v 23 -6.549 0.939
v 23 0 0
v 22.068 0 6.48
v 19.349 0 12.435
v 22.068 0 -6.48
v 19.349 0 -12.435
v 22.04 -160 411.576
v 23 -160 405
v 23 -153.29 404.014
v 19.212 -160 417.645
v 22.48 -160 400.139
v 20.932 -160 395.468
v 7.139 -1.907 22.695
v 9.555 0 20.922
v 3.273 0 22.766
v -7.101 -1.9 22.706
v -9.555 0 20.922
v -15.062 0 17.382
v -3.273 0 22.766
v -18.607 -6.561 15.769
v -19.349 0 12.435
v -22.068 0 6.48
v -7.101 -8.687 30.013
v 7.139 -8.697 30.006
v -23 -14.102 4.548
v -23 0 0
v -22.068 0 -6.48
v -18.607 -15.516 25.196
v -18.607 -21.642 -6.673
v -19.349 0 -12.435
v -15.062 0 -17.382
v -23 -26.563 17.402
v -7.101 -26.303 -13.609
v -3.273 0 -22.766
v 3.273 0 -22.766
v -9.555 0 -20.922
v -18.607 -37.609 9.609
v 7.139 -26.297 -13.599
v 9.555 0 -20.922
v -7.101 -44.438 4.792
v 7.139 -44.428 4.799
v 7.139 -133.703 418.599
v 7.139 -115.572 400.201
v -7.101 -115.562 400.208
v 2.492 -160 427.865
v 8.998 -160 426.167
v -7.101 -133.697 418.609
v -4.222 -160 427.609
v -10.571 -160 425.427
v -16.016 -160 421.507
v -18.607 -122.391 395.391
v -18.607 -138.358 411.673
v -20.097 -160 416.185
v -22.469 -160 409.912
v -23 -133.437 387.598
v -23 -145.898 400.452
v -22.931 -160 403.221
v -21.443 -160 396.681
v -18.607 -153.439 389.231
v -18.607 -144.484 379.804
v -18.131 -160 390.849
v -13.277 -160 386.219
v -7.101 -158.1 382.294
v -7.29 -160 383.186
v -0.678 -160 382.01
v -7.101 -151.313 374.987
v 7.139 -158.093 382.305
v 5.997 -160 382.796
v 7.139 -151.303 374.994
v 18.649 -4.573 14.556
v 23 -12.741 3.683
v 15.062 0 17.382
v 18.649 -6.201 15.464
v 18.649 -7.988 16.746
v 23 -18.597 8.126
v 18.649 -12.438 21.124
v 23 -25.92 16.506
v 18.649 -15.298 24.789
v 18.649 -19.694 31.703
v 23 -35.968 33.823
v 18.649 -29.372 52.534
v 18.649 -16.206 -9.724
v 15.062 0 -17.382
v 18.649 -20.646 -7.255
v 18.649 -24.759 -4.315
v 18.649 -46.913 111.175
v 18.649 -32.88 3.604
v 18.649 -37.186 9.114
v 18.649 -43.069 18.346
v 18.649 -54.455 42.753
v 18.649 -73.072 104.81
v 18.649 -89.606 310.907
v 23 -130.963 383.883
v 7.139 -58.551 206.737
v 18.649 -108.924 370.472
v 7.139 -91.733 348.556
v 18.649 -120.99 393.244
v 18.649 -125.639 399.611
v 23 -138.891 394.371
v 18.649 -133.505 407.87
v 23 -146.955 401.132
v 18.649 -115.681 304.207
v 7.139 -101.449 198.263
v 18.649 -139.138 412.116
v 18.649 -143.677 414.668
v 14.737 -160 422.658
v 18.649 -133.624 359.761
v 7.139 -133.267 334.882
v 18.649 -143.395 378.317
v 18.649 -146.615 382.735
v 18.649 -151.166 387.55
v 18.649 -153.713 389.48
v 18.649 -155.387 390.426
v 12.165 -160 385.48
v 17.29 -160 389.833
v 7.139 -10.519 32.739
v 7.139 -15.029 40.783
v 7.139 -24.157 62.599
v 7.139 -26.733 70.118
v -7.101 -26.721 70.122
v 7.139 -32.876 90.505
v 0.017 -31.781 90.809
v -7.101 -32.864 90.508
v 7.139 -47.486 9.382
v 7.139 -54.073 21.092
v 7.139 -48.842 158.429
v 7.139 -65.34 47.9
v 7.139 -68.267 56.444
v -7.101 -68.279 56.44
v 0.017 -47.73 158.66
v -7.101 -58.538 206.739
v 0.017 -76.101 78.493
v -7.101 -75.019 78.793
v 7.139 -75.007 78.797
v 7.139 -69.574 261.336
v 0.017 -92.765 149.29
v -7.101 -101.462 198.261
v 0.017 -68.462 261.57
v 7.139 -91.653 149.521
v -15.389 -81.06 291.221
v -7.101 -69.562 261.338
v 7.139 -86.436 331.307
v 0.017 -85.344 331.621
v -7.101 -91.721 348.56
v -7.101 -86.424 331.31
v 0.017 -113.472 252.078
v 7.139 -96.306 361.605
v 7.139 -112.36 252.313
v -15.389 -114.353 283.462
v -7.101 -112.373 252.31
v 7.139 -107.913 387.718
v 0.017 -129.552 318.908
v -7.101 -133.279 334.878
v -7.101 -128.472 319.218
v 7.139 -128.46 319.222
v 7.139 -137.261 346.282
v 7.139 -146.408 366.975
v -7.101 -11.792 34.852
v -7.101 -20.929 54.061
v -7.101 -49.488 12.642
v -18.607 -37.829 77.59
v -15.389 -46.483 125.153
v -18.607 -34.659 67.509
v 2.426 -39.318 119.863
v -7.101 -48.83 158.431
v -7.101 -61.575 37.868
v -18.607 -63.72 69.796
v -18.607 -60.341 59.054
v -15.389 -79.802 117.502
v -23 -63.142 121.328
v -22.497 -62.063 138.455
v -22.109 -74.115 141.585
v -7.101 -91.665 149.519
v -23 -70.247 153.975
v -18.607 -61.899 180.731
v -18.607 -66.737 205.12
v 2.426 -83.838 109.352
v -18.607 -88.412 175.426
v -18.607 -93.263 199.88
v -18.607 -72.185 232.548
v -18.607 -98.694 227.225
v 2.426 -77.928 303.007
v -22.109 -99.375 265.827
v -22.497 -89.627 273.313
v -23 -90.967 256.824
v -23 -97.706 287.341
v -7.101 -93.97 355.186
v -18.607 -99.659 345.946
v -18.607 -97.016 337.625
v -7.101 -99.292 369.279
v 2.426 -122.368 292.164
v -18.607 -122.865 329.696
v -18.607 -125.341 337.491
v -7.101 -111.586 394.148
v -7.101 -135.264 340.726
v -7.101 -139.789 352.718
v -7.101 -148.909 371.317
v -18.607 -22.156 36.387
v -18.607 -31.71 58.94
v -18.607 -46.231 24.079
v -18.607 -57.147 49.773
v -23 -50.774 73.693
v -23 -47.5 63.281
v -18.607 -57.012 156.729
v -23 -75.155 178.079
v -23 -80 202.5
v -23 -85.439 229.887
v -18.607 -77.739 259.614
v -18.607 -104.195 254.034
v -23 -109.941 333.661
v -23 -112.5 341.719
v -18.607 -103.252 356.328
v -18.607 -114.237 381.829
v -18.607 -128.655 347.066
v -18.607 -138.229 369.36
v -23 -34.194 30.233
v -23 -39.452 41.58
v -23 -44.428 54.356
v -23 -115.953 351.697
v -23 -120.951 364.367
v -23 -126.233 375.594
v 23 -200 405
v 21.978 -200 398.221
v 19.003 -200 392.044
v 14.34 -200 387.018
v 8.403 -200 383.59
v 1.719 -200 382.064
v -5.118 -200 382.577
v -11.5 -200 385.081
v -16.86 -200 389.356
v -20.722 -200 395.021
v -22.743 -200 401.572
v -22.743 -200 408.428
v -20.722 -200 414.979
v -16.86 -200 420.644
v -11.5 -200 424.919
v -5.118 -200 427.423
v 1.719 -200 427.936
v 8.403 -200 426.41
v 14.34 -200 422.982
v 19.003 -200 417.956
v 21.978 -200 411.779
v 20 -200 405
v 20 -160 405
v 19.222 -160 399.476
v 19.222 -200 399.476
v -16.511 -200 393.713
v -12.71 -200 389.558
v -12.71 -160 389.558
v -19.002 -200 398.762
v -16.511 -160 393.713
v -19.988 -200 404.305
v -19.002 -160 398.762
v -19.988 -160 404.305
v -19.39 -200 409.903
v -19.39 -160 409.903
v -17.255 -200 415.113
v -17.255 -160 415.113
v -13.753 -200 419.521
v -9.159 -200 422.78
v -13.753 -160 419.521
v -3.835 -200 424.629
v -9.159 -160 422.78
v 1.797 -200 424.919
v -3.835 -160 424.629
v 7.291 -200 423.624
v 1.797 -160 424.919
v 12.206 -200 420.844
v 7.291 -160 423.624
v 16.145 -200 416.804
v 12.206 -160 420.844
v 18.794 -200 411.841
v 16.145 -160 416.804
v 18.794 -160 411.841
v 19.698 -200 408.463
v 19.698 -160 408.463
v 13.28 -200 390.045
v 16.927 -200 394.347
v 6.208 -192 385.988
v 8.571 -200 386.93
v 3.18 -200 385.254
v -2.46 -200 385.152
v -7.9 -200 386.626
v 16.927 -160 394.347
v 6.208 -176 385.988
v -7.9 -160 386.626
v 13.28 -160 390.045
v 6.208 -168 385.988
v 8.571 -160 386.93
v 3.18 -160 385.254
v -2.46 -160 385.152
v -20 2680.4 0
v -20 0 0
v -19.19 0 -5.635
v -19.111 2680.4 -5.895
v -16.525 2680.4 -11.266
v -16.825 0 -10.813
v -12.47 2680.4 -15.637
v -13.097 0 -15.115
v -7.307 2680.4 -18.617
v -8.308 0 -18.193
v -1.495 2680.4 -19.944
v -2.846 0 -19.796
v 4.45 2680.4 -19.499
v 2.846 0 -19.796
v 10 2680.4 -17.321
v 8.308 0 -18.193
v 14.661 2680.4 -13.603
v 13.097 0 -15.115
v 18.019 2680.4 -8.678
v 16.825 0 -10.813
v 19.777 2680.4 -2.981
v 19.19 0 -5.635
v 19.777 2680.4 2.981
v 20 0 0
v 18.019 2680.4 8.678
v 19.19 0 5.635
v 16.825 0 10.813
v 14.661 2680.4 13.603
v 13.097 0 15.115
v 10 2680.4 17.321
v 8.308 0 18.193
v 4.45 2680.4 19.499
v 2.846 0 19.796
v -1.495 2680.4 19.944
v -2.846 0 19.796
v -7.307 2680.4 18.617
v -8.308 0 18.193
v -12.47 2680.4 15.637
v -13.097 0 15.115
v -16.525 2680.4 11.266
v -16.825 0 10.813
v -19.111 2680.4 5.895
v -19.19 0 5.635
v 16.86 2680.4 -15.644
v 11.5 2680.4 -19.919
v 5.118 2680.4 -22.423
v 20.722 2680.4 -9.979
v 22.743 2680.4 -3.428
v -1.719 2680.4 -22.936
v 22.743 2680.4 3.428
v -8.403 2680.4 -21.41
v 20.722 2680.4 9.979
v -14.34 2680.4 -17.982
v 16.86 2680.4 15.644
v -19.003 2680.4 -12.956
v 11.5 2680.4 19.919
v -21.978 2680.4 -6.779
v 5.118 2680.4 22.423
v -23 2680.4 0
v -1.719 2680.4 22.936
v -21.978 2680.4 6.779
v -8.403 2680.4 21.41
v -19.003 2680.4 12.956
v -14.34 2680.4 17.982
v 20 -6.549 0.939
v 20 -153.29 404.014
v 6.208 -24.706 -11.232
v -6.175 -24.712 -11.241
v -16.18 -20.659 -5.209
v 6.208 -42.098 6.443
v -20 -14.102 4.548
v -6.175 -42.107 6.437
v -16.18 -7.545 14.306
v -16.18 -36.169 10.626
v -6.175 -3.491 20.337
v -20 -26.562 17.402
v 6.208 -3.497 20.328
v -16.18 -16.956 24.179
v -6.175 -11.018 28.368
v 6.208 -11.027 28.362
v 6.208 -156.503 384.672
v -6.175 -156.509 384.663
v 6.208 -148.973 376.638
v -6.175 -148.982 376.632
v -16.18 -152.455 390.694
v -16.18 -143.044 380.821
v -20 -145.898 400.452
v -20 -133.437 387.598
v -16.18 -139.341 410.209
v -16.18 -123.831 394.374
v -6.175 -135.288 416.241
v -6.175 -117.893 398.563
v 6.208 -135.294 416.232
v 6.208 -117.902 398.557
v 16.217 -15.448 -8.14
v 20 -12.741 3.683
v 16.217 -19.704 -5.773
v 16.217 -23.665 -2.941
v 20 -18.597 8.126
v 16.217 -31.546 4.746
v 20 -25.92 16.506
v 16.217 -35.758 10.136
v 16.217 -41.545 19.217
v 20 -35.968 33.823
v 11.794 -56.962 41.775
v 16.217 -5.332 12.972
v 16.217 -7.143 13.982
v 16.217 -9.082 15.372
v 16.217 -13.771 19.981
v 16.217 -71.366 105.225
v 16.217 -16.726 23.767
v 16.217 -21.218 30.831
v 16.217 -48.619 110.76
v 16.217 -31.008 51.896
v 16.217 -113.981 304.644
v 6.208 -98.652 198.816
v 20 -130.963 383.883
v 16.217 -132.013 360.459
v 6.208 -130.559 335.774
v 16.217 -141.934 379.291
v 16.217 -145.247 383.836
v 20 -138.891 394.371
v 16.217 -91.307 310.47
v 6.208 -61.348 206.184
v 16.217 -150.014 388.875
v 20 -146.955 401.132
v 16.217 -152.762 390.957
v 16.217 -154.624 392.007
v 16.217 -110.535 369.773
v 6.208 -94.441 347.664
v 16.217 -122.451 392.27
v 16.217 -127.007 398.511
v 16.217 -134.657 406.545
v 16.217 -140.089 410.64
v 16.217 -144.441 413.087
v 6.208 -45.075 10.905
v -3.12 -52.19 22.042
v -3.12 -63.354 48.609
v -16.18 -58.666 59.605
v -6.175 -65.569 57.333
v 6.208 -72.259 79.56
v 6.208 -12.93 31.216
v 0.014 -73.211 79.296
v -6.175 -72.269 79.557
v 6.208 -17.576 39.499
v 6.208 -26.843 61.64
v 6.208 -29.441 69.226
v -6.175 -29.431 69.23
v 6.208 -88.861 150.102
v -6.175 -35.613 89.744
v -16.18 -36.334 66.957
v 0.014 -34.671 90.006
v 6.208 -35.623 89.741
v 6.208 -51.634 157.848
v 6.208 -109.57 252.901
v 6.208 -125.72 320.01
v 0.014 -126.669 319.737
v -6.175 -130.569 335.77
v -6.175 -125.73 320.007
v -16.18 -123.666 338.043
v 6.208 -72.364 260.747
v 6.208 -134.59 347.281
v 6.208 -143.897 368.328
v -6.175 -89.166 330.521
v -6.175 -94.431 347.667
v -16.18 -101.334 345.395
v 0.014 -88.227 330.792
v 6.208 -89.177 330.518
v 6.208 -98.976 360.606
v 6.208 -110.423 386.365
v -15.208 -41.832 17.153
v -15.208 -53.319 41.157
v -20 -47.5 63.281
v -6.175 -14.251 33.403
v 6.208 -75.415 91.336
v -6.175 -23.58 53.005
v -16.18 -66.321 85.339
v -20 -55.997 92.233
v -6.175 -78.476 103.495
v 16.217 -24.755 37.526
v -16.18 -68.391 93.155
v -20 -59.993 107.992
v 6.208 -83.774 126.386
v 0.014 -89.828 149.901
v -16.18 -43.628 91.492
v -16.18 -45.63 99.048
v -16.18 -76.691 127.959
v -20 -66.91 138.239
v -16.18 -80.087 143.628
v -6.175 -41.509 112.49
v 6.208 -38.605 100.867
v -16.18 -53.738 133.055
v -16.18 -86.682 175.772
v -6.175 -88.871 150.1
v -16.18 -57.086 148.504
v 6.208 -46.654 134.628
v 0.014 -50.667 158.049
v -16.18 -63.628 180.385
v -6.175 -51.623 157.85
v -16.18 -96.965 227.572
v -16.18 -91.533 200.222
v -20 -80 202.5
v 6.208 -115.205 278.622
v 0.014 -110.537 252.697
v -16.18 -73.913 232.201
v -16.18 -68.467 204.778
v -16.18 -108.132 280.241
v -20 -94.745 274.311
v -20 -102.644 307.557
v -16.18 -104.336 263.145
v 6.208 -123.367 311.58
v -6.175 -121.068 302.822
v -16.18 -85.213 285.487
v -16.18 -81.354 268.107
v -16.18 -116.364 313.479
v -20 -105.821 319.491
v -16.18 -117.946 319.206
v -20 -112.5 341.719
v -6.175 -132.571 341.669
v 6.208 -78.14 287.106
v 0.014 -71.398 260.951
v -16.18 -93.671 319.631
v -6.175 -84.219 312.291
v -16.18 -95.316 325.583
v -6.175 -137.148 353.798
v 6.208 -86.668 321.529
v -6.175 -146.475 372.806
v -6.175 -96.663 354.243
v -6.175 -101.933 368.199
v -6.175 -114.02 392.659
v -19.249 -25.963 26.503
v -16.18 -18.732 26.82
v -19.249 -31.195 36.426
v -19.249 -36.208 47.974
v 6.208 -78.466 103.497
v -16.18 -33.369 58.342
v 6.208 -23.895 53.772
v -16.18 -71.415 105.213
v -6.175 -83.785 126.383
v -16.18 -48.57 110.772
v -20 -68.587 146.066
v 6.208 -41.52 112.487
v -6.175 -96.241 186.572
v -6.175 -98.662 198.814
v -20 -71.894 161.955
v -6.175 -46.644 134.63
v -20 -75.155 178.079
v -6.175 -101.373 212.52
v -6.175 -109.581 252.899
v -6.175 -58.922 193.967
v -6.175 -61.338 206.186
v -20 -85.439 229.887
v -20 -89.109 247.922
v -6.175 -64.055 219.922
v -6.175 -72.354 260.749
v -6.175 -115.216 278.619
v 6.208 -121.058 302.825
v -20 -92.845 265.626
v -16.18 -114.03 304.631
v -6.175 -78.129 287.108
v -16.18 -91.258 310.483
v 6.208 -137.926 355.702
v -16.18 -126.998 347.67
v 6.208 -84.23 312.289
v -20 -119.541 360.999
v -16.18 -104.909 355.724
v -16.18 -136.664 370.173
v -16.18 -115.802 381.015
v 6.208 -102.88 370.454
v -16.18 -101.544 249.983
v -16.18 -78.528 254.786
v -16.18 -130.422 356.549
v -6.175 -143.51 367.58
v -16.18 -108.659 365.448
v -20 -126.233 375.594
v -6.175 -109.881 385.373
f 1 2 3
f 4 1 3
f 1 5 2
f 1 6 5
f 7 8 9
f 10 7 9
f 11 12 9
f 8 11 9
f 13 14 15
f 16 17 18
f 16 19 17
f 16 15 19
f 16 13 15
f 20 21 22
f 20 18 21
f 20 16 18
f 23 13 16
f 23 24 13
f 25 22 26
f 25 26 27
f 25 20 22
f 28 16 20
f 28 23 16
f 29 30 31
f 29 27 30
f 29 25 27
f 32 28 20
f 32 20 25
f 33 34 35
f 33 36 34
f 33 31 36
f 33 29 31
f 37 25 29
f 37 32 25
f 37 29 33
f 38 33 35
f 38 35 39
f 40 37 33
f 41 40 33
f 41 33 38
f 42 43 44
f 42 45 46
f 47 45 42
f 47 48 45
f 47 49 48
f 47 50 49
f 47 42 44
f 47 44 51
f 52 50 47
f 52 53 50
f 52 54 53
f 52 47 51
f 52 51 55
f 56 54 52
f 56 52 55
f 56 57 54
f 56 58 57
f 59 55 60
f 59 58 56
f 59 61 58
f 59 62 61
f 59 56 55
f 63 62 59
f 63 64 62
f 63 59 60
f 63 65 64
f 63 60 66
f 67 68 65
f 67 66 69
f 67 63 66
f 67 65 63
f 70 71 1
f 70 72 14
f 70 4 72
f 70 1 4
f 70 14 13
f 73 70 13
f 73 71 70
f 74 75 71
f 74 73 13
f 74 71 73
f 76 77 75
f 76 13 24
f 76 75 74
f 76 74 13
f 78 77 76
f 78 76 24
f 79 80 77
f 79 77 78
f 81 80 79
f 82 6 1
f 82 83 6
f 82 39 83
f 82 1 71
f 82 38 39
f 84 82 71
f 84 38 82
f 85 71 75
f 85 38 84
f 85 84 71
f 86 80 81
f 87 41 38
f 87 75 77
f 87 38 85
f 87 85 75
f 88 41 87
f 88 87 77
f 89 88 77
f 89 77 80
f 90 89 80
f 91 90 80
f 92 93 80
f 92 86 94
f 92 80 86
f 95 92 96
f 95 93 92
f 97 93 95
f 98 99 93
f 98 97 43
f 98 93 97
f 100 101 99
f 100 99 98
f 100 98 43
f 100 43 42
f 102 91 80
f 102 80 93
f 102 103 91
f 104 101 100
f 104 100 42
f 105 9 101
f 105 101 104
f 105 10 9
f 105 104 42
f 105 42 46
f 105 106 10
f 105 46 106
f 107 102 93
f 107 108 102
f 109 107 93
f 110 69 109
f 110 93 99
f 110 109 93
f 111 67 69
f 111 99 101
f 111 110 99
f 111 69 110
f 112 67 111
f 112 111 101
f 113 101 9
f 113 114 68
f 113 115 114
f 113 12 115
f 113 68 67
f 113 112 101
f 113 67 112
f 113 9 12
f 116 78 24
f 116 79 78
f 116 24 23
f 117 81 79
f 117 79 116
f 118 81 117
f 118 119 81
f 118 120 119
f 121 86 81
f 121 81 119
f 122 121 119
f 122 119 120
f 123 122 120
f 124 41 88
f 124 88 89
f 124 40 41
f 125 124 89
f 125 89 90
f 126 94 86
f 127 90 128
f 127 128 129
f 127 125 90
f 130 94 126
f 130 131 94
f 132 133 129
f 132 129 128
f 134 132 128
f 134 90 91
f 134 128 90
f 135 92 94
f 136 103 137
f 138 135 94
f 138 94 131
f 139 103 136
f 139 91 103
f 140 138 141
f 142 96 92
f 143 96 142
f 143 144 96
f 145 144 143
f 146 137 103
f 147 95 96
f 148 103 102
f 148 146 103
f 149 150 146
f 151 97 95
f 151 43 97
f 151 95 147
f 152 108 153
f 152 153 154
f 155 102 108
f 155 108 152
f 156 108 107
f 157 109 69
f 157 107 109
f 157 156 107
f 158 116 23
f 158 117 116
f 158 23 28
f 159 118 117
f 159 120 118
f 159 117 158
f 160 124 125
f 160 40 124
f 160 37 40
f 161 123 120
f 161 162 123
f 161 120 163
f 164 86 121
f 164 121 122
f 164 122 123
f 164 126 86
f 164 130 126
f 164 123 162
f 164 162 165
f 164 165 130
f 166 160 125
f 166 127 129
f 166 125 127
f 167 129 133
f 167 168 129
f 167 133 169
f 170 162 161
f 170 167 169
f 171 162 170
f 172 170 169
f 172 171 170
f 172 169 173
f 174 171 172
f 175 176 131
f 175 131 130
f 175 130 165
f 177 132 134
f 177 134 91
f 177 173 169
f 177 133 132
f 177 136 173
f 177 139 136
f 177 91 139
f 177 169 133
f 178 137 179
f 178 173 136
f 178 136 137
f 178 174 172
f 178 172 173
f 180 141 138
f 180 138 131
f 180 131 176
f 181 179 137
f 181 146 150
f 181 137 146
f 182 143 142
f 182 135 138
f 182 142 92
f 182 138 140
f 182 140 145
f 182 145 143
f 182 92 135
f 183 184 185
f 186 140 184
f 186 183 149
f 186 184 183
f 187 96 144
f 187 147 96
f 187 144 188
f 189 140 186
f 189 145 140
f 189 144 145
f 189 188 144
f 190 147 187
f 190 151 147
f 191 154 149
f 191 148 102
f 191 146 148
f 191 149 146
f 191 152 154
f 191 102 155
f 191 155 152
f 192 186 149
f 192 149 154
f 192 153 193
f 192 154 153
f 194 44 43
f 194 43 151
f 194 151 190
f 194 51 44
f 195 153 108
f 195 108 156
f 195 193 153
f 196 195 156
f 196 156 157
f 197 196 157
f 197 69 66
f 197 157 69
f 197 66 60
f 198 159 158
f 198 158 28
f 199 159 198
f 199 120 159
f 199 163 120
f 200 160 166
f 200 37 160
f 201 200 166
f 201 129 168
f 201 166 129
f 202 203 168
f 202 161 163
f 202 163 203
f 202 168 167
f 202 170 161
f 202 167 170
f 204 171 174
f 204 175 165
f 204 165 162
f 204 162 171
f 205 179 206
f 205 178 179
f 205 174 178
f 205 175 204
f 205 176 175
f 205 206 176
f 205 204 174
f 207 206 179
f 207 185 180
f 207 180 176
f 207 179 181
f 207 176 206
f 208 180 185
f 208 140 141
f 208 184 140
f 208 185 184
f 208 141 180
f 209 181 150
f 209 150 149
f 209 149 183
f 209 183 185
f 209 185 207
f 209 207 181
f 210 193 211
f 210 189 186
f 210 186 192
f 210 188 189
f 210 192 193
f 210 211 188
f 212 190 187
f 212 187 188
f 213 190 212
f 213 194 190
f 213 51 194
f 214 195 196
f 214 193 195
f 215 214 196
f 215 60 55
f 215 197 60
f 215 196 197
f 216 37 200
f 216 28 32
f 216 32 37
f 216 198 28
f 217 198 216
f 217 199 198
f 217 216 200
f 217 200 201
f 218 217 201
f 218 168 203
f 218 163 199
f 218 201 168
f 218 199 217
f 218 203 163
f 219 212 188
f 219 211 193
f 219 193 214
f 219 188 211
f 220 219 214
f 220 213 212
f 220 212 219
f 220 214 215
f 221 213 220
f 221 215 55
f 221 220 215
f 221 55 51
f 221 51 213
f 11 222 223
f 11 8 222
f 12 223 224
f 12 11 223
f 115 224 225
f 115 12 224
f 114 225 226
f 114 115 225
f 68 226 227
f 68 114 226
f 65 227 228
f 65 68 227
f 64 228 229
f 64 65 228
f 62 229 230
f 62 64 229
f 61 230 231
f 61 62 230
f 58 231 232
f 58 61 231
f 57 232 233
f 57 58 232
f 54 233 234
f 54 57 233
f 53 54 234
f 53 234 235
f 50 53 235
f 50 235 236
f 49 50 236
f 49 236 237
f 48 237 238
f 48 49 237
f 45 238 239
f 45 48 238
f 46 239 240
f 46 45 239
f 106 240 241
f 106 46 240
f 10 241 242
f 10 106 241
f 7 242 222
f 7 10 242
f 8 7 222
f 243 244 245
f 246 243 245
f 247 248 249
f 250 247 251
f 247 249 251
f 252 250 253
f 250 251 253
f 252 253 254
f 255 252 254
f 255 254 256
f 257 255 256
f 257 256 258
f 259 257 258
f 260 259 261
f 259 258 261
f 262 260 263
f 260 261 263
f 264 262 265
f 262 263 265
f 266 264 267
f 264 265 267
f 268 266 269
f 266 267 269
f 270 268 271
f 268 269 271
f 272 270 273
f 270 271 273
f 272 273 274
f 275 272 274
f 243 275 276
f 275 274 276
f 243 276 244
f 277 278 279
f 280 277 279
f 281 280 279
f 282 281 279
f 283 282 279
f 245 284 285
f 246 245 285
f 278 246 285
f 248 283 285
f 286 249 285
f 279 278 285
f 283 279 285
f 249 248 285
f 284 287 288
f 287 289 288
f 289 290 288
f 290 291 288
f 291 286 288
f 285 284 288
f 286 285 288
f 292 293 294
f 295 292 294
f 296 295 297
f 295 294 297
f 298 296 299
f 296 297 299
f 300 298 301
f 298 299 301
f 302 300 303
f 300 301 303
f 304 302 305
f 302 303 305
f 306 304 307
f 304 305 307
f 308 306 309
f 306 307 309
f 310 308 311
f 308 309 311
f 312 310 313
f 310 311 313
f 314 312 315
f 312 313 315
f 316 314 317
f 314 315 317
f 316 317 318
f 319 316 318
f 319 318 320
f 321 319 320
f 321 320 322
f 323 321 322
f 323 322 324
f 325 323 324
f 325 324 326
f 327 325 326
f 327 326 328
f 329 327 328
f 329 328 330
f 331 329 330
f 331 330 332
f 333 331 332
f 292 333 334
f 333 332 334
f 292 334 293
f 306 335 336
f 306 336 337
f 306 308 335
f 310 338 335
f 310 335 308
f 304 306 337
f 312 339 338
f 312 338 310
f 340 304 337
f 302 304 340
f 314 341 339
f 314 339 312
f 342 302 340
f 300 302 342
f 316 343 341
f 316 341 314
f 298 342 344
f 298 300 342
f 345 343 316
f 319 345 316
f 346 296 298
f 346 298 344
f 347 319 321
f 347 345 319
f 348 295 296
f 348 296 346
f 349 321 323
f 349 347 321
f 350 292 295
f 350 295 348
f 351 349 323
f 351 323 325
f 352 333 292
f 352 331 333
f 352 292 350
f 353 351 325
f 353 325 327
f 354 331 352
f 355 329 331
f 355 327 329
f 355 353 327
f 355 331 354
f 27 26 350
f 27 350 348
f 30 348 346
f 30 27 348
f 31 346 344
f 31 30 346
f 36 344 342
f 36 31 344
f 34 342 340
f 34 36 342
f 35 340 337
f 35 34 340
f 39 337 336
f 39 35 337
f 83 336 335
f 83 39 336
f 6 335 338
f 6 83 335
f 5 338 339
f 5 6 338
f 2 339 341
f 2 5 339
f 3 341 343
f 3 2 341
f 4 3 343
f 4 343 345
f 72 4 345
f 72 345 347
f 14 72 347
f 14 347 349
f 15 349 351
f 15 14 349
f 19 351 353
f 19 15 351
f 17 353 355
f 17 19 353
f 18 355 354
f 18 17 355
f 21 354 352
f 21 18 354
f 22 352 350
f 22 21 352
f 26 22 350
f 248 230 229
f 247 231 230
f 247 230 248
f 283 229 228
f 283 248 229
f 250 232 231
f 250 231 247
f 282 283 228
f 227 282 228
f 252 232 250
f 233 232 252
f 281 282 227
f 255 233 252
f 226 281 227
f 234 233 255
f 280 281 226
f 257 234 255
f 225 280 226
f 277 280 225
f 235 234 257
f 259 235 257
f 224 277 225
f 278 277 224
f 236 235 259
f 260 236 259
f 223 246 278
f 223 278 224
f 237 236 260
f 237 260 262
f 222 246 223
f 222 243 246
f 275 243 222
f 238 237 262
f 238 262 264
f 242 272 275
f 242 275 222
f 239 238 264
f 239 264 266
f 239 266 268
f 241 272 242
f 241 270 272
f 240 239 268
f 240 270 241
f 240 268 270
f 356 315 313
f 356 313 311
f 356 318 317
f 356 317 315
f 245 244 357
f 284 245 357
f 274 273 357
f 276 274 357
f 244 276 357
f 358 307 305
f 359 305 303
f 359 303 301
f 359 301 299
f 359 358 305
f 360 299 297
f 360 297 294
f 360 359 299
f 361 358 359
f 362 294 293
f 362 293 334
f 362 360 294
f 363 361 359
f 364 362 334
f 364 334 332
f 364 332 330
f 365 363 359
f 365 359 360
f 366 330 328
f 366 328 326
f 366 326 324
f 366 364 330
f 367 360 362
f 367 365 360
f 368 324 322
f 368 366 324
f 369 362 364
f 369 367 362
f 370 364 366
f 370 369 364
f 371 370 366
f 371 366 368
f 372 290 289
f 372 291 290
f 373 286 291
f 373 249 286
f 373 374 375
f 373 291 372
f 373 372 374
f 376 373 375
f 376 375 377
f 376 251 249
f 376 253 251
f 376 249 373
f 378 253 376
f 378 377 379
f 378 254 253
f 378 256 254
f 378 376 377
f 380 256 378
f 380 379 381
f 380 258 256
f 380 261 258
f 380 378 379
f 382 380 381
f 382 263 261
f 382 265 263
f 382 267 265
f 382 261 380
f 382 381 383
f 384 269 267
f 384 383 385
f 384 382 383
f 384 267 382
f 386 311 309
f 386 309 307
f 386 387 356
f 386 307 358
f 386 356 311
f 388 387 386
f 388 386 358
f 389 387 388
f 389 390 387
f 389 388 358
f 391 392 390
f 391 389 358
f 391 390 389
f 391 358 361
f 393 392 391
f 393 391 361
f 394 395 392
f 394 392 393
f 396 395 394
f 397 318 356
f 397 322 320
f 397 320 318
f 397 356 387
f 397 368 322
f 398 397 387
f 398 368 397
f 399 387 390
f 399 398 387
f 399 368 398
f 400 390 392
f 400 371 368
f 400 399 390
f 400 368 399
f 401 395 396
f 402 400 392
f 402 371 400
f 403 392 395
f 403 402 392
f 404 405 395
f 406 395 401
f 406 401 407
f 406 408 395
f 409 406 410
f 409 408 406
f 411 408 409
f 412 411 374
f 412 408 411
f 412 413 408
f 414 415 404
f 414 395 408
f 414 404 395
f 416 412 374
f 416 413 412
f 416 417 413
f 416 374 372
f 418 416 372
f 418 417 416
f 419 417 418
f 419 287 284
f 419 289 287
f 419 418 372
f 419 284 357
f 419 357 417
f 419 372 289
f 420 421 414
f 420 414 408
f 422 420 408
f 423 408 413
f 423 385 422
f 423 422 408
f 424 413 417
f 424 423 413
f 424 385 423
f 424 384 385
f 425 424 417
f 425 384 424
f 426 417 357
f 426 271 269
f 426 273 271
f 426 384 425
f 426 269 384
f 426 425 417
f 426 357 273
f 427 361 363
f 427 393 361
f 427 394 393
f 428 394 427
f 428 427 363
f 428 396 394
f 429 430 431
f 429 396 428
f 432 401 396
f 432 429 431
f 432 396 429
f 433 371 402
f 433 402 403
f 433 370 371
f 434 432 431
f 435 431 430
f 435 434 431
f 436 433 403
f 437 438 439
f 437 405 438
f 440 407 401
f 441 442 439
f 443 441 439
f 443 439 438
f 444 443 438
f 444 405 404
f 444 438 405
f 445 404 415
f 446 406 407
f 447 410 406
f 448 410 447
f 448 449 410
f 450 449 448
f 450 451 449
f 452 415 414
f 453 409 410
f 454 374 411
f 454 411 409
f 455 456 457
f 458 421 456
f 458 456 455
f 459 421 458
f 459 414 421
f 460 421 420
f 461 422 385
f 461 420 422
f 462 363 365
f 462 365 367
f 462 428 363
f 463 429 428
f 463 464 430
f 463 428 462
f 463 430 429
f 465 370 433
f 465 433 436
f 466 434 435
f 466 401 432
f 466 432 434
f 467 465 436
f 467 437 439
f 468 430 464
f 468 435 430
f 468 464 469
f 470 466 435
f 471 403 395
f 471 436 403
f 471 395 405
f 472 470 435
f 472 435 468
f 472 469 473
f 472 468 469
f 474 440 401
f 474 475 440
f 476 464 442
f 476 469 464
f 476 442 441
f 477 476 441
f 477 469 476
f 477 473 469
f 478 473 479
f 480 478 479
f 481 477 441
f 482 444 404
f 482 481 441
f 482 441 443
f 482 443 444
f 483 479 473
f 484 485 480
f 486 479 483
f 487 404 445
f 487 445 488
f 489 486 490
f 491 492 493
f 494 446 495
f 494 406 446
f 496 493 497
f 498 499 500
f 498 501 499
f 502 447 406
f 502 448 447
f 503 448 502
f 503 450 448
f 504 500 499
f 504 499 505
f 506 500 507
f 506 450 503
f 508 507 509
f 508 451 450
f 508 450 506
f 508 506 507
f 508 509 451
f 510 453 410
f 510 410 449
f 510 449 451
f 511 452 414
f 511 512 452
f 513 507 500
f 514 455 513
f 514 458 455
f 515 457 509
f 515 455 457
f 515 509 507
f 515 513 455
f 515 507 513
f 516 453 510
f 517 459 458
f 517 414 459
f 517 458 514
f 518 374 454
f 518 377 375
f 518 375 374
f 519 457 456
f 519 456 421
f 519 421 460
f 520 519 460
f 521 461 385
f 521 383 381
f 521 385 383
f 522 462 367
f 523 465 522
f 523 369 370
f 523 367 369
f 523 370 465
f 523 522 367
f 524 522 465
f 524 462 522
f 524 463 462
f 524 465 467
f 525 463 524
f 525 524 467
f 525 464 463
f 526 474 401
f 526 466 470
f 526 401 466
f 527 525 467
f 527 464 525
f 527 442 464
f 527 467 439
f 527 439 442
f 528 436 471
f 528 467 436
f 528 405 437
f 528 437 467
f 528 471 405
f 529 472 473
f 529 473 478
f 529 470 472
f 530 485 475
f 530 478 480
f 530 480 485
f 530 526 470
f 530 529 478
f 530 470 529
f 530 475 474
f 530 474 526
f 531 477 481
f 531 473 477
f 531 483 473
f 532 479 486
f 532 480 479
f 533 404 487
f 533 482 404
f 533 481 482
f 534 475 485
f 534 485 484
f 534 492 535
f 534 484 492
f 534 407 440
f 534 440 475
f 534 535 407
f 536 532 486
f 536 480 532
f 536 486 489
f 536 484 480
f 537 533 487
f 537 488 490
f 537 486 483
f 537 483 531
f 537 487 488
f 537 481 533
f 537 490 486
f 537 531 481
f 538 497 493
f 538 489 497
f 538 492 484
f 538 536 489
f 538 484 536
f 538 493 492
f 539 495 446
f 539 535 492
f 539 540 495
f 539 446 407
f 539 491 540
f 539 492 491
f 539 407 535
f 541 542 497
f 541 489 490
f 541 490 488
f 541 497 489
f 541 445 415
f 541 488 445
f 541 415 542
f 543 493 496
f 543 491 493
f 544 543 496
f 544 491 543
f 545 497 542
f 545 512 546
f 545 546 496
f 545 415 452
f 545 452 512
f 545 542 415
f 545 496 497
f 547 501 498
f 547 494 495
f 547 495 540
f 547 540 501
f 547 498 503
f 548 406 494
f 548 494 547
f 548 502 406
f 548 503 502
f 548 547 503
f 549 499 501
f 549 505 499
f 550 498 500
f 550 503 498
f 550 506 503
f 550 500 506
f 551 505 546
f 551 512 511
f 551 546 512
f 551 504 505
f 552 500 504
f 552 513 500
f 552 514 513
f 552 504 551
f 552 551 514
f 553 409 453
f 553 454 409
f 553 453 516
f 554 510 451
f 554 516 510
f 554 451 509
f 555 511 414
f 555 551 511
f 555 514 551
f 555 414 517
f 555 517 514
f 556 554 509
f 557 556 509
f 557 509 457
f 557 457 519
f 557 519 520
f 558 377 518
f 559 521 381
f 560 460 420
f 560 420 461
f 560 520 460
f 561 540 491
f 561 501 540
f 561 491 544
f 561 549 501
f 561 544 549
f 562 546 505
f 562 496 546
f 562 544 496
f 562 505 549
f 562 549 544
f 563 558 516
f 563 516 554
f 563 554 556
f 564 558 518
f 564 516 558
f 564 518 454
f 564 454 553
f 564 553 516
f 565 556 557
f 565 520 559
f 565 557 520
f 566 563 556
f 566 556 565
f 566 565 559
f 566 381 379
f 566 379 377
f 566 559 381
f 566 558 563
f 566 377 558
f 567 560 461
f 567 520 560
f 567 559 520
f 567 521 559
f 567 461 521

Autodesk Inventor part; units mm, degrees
ref_plane "YZ Plane" through (0, 0, 0) normal (1, 0, 0) x (0, 1, 0)
ref_plane "XZ Plane" through (0, 0, 0) normal (0, 1, 0) x (-1, 0, 0)
ref_plane "XY Plane" through (0, 0, 0) normal (0, 0, 1) x (1, 0, 0)
sketch "Sketch1" plane through (0, 0, 0) normal (0, 1, 0) x (-1, 0, 0)
  circle A0 centre (0, 0) radius 23
  circle A1 centre (0, 0) radius 20
  dimension "d0" = 3
  dimension "d1" = 40
extrude "Extrusion1" add sketch "Sketch1" along normal blind 2680.4
sketch "Sketch2" plane through (0, 0, 0) normal (0, 0, 1) x (1, 0, 0)
  line L0 (23, 2680.4) -> (-23, 2680.4) projected
  point P0 (0, 0)
  point P1 (0, 2673.4)
  point P2 (0, 2680.4)
  dimension "d4" = 7
hole "Hole1" [suppressed]
sketch3d "3D Sketch1"
sketch "Sketch3" plane through (0, 0, 0) normal (0, -1, 0) x (1, 0, 0)
  circle A0 centre (0, 0) radius 20 projected
  circle A1 centre (0, 0) radius 23 projected
sweep "Sweep1" [suppressed]
sketch "Sketch4" plane through (162.5, -96, -92.5) normal (0, 0, -1) x (-1, 0, 0)
  circle A0 centre (0, 0) radius 23 projected
  point P0 (162.5, 96)
  point P1 (-22.6674, -3.8973)
extrude "Extrusion2" [suppressed]
sketch "Sketch5" plane through (0, 0, 0) normal (0, -1, 0) x (1, 0, 0)
  circle A0 centre (0, 0) radius 20 projected
  circle A1 centre (0, 0) radius 23 projected
sketch3d "3D Sketch2"
  spline S0 degree 3 poles (0, 0, 0) (0, -80, 0) (0, -80, 405) (0, -160, 405) knots 1 1 1 1 2 2 2 2
  dimension "d28" = 80
  dimension "d29" = 405
  dimension "d30" = 80
sweep "Sweep2" add profiles "Sketch5" path "3D Sketch2"
sketch "Sketch6" plane through (0, -160, 405) normal (0, -1, 0) x (1, 0, 0)
  spline S0 degree 6 poles (20, 0) (20, -33.2309) (-21.091, -38.0022) (-54.9823, 0) (-21.091, 38.0022) (20, 33.2309) (20, 0) knots 0 0 0 0 0 0 0 1 1 1 1 1 1 1 weights 1.669078 1.03673 1.038347 0.853534 1.038347 1.03673 1.669078 projected
  circle A0 centre (0, 0) radius 23 projected
  point P0 (0, -405)
  point P1 (23, 0)
extrude "Extrusion3" add sketch "Sketch6" along normal blind 40
properties part number "Top_End Pipe 1" material "PMMA Plastic"
